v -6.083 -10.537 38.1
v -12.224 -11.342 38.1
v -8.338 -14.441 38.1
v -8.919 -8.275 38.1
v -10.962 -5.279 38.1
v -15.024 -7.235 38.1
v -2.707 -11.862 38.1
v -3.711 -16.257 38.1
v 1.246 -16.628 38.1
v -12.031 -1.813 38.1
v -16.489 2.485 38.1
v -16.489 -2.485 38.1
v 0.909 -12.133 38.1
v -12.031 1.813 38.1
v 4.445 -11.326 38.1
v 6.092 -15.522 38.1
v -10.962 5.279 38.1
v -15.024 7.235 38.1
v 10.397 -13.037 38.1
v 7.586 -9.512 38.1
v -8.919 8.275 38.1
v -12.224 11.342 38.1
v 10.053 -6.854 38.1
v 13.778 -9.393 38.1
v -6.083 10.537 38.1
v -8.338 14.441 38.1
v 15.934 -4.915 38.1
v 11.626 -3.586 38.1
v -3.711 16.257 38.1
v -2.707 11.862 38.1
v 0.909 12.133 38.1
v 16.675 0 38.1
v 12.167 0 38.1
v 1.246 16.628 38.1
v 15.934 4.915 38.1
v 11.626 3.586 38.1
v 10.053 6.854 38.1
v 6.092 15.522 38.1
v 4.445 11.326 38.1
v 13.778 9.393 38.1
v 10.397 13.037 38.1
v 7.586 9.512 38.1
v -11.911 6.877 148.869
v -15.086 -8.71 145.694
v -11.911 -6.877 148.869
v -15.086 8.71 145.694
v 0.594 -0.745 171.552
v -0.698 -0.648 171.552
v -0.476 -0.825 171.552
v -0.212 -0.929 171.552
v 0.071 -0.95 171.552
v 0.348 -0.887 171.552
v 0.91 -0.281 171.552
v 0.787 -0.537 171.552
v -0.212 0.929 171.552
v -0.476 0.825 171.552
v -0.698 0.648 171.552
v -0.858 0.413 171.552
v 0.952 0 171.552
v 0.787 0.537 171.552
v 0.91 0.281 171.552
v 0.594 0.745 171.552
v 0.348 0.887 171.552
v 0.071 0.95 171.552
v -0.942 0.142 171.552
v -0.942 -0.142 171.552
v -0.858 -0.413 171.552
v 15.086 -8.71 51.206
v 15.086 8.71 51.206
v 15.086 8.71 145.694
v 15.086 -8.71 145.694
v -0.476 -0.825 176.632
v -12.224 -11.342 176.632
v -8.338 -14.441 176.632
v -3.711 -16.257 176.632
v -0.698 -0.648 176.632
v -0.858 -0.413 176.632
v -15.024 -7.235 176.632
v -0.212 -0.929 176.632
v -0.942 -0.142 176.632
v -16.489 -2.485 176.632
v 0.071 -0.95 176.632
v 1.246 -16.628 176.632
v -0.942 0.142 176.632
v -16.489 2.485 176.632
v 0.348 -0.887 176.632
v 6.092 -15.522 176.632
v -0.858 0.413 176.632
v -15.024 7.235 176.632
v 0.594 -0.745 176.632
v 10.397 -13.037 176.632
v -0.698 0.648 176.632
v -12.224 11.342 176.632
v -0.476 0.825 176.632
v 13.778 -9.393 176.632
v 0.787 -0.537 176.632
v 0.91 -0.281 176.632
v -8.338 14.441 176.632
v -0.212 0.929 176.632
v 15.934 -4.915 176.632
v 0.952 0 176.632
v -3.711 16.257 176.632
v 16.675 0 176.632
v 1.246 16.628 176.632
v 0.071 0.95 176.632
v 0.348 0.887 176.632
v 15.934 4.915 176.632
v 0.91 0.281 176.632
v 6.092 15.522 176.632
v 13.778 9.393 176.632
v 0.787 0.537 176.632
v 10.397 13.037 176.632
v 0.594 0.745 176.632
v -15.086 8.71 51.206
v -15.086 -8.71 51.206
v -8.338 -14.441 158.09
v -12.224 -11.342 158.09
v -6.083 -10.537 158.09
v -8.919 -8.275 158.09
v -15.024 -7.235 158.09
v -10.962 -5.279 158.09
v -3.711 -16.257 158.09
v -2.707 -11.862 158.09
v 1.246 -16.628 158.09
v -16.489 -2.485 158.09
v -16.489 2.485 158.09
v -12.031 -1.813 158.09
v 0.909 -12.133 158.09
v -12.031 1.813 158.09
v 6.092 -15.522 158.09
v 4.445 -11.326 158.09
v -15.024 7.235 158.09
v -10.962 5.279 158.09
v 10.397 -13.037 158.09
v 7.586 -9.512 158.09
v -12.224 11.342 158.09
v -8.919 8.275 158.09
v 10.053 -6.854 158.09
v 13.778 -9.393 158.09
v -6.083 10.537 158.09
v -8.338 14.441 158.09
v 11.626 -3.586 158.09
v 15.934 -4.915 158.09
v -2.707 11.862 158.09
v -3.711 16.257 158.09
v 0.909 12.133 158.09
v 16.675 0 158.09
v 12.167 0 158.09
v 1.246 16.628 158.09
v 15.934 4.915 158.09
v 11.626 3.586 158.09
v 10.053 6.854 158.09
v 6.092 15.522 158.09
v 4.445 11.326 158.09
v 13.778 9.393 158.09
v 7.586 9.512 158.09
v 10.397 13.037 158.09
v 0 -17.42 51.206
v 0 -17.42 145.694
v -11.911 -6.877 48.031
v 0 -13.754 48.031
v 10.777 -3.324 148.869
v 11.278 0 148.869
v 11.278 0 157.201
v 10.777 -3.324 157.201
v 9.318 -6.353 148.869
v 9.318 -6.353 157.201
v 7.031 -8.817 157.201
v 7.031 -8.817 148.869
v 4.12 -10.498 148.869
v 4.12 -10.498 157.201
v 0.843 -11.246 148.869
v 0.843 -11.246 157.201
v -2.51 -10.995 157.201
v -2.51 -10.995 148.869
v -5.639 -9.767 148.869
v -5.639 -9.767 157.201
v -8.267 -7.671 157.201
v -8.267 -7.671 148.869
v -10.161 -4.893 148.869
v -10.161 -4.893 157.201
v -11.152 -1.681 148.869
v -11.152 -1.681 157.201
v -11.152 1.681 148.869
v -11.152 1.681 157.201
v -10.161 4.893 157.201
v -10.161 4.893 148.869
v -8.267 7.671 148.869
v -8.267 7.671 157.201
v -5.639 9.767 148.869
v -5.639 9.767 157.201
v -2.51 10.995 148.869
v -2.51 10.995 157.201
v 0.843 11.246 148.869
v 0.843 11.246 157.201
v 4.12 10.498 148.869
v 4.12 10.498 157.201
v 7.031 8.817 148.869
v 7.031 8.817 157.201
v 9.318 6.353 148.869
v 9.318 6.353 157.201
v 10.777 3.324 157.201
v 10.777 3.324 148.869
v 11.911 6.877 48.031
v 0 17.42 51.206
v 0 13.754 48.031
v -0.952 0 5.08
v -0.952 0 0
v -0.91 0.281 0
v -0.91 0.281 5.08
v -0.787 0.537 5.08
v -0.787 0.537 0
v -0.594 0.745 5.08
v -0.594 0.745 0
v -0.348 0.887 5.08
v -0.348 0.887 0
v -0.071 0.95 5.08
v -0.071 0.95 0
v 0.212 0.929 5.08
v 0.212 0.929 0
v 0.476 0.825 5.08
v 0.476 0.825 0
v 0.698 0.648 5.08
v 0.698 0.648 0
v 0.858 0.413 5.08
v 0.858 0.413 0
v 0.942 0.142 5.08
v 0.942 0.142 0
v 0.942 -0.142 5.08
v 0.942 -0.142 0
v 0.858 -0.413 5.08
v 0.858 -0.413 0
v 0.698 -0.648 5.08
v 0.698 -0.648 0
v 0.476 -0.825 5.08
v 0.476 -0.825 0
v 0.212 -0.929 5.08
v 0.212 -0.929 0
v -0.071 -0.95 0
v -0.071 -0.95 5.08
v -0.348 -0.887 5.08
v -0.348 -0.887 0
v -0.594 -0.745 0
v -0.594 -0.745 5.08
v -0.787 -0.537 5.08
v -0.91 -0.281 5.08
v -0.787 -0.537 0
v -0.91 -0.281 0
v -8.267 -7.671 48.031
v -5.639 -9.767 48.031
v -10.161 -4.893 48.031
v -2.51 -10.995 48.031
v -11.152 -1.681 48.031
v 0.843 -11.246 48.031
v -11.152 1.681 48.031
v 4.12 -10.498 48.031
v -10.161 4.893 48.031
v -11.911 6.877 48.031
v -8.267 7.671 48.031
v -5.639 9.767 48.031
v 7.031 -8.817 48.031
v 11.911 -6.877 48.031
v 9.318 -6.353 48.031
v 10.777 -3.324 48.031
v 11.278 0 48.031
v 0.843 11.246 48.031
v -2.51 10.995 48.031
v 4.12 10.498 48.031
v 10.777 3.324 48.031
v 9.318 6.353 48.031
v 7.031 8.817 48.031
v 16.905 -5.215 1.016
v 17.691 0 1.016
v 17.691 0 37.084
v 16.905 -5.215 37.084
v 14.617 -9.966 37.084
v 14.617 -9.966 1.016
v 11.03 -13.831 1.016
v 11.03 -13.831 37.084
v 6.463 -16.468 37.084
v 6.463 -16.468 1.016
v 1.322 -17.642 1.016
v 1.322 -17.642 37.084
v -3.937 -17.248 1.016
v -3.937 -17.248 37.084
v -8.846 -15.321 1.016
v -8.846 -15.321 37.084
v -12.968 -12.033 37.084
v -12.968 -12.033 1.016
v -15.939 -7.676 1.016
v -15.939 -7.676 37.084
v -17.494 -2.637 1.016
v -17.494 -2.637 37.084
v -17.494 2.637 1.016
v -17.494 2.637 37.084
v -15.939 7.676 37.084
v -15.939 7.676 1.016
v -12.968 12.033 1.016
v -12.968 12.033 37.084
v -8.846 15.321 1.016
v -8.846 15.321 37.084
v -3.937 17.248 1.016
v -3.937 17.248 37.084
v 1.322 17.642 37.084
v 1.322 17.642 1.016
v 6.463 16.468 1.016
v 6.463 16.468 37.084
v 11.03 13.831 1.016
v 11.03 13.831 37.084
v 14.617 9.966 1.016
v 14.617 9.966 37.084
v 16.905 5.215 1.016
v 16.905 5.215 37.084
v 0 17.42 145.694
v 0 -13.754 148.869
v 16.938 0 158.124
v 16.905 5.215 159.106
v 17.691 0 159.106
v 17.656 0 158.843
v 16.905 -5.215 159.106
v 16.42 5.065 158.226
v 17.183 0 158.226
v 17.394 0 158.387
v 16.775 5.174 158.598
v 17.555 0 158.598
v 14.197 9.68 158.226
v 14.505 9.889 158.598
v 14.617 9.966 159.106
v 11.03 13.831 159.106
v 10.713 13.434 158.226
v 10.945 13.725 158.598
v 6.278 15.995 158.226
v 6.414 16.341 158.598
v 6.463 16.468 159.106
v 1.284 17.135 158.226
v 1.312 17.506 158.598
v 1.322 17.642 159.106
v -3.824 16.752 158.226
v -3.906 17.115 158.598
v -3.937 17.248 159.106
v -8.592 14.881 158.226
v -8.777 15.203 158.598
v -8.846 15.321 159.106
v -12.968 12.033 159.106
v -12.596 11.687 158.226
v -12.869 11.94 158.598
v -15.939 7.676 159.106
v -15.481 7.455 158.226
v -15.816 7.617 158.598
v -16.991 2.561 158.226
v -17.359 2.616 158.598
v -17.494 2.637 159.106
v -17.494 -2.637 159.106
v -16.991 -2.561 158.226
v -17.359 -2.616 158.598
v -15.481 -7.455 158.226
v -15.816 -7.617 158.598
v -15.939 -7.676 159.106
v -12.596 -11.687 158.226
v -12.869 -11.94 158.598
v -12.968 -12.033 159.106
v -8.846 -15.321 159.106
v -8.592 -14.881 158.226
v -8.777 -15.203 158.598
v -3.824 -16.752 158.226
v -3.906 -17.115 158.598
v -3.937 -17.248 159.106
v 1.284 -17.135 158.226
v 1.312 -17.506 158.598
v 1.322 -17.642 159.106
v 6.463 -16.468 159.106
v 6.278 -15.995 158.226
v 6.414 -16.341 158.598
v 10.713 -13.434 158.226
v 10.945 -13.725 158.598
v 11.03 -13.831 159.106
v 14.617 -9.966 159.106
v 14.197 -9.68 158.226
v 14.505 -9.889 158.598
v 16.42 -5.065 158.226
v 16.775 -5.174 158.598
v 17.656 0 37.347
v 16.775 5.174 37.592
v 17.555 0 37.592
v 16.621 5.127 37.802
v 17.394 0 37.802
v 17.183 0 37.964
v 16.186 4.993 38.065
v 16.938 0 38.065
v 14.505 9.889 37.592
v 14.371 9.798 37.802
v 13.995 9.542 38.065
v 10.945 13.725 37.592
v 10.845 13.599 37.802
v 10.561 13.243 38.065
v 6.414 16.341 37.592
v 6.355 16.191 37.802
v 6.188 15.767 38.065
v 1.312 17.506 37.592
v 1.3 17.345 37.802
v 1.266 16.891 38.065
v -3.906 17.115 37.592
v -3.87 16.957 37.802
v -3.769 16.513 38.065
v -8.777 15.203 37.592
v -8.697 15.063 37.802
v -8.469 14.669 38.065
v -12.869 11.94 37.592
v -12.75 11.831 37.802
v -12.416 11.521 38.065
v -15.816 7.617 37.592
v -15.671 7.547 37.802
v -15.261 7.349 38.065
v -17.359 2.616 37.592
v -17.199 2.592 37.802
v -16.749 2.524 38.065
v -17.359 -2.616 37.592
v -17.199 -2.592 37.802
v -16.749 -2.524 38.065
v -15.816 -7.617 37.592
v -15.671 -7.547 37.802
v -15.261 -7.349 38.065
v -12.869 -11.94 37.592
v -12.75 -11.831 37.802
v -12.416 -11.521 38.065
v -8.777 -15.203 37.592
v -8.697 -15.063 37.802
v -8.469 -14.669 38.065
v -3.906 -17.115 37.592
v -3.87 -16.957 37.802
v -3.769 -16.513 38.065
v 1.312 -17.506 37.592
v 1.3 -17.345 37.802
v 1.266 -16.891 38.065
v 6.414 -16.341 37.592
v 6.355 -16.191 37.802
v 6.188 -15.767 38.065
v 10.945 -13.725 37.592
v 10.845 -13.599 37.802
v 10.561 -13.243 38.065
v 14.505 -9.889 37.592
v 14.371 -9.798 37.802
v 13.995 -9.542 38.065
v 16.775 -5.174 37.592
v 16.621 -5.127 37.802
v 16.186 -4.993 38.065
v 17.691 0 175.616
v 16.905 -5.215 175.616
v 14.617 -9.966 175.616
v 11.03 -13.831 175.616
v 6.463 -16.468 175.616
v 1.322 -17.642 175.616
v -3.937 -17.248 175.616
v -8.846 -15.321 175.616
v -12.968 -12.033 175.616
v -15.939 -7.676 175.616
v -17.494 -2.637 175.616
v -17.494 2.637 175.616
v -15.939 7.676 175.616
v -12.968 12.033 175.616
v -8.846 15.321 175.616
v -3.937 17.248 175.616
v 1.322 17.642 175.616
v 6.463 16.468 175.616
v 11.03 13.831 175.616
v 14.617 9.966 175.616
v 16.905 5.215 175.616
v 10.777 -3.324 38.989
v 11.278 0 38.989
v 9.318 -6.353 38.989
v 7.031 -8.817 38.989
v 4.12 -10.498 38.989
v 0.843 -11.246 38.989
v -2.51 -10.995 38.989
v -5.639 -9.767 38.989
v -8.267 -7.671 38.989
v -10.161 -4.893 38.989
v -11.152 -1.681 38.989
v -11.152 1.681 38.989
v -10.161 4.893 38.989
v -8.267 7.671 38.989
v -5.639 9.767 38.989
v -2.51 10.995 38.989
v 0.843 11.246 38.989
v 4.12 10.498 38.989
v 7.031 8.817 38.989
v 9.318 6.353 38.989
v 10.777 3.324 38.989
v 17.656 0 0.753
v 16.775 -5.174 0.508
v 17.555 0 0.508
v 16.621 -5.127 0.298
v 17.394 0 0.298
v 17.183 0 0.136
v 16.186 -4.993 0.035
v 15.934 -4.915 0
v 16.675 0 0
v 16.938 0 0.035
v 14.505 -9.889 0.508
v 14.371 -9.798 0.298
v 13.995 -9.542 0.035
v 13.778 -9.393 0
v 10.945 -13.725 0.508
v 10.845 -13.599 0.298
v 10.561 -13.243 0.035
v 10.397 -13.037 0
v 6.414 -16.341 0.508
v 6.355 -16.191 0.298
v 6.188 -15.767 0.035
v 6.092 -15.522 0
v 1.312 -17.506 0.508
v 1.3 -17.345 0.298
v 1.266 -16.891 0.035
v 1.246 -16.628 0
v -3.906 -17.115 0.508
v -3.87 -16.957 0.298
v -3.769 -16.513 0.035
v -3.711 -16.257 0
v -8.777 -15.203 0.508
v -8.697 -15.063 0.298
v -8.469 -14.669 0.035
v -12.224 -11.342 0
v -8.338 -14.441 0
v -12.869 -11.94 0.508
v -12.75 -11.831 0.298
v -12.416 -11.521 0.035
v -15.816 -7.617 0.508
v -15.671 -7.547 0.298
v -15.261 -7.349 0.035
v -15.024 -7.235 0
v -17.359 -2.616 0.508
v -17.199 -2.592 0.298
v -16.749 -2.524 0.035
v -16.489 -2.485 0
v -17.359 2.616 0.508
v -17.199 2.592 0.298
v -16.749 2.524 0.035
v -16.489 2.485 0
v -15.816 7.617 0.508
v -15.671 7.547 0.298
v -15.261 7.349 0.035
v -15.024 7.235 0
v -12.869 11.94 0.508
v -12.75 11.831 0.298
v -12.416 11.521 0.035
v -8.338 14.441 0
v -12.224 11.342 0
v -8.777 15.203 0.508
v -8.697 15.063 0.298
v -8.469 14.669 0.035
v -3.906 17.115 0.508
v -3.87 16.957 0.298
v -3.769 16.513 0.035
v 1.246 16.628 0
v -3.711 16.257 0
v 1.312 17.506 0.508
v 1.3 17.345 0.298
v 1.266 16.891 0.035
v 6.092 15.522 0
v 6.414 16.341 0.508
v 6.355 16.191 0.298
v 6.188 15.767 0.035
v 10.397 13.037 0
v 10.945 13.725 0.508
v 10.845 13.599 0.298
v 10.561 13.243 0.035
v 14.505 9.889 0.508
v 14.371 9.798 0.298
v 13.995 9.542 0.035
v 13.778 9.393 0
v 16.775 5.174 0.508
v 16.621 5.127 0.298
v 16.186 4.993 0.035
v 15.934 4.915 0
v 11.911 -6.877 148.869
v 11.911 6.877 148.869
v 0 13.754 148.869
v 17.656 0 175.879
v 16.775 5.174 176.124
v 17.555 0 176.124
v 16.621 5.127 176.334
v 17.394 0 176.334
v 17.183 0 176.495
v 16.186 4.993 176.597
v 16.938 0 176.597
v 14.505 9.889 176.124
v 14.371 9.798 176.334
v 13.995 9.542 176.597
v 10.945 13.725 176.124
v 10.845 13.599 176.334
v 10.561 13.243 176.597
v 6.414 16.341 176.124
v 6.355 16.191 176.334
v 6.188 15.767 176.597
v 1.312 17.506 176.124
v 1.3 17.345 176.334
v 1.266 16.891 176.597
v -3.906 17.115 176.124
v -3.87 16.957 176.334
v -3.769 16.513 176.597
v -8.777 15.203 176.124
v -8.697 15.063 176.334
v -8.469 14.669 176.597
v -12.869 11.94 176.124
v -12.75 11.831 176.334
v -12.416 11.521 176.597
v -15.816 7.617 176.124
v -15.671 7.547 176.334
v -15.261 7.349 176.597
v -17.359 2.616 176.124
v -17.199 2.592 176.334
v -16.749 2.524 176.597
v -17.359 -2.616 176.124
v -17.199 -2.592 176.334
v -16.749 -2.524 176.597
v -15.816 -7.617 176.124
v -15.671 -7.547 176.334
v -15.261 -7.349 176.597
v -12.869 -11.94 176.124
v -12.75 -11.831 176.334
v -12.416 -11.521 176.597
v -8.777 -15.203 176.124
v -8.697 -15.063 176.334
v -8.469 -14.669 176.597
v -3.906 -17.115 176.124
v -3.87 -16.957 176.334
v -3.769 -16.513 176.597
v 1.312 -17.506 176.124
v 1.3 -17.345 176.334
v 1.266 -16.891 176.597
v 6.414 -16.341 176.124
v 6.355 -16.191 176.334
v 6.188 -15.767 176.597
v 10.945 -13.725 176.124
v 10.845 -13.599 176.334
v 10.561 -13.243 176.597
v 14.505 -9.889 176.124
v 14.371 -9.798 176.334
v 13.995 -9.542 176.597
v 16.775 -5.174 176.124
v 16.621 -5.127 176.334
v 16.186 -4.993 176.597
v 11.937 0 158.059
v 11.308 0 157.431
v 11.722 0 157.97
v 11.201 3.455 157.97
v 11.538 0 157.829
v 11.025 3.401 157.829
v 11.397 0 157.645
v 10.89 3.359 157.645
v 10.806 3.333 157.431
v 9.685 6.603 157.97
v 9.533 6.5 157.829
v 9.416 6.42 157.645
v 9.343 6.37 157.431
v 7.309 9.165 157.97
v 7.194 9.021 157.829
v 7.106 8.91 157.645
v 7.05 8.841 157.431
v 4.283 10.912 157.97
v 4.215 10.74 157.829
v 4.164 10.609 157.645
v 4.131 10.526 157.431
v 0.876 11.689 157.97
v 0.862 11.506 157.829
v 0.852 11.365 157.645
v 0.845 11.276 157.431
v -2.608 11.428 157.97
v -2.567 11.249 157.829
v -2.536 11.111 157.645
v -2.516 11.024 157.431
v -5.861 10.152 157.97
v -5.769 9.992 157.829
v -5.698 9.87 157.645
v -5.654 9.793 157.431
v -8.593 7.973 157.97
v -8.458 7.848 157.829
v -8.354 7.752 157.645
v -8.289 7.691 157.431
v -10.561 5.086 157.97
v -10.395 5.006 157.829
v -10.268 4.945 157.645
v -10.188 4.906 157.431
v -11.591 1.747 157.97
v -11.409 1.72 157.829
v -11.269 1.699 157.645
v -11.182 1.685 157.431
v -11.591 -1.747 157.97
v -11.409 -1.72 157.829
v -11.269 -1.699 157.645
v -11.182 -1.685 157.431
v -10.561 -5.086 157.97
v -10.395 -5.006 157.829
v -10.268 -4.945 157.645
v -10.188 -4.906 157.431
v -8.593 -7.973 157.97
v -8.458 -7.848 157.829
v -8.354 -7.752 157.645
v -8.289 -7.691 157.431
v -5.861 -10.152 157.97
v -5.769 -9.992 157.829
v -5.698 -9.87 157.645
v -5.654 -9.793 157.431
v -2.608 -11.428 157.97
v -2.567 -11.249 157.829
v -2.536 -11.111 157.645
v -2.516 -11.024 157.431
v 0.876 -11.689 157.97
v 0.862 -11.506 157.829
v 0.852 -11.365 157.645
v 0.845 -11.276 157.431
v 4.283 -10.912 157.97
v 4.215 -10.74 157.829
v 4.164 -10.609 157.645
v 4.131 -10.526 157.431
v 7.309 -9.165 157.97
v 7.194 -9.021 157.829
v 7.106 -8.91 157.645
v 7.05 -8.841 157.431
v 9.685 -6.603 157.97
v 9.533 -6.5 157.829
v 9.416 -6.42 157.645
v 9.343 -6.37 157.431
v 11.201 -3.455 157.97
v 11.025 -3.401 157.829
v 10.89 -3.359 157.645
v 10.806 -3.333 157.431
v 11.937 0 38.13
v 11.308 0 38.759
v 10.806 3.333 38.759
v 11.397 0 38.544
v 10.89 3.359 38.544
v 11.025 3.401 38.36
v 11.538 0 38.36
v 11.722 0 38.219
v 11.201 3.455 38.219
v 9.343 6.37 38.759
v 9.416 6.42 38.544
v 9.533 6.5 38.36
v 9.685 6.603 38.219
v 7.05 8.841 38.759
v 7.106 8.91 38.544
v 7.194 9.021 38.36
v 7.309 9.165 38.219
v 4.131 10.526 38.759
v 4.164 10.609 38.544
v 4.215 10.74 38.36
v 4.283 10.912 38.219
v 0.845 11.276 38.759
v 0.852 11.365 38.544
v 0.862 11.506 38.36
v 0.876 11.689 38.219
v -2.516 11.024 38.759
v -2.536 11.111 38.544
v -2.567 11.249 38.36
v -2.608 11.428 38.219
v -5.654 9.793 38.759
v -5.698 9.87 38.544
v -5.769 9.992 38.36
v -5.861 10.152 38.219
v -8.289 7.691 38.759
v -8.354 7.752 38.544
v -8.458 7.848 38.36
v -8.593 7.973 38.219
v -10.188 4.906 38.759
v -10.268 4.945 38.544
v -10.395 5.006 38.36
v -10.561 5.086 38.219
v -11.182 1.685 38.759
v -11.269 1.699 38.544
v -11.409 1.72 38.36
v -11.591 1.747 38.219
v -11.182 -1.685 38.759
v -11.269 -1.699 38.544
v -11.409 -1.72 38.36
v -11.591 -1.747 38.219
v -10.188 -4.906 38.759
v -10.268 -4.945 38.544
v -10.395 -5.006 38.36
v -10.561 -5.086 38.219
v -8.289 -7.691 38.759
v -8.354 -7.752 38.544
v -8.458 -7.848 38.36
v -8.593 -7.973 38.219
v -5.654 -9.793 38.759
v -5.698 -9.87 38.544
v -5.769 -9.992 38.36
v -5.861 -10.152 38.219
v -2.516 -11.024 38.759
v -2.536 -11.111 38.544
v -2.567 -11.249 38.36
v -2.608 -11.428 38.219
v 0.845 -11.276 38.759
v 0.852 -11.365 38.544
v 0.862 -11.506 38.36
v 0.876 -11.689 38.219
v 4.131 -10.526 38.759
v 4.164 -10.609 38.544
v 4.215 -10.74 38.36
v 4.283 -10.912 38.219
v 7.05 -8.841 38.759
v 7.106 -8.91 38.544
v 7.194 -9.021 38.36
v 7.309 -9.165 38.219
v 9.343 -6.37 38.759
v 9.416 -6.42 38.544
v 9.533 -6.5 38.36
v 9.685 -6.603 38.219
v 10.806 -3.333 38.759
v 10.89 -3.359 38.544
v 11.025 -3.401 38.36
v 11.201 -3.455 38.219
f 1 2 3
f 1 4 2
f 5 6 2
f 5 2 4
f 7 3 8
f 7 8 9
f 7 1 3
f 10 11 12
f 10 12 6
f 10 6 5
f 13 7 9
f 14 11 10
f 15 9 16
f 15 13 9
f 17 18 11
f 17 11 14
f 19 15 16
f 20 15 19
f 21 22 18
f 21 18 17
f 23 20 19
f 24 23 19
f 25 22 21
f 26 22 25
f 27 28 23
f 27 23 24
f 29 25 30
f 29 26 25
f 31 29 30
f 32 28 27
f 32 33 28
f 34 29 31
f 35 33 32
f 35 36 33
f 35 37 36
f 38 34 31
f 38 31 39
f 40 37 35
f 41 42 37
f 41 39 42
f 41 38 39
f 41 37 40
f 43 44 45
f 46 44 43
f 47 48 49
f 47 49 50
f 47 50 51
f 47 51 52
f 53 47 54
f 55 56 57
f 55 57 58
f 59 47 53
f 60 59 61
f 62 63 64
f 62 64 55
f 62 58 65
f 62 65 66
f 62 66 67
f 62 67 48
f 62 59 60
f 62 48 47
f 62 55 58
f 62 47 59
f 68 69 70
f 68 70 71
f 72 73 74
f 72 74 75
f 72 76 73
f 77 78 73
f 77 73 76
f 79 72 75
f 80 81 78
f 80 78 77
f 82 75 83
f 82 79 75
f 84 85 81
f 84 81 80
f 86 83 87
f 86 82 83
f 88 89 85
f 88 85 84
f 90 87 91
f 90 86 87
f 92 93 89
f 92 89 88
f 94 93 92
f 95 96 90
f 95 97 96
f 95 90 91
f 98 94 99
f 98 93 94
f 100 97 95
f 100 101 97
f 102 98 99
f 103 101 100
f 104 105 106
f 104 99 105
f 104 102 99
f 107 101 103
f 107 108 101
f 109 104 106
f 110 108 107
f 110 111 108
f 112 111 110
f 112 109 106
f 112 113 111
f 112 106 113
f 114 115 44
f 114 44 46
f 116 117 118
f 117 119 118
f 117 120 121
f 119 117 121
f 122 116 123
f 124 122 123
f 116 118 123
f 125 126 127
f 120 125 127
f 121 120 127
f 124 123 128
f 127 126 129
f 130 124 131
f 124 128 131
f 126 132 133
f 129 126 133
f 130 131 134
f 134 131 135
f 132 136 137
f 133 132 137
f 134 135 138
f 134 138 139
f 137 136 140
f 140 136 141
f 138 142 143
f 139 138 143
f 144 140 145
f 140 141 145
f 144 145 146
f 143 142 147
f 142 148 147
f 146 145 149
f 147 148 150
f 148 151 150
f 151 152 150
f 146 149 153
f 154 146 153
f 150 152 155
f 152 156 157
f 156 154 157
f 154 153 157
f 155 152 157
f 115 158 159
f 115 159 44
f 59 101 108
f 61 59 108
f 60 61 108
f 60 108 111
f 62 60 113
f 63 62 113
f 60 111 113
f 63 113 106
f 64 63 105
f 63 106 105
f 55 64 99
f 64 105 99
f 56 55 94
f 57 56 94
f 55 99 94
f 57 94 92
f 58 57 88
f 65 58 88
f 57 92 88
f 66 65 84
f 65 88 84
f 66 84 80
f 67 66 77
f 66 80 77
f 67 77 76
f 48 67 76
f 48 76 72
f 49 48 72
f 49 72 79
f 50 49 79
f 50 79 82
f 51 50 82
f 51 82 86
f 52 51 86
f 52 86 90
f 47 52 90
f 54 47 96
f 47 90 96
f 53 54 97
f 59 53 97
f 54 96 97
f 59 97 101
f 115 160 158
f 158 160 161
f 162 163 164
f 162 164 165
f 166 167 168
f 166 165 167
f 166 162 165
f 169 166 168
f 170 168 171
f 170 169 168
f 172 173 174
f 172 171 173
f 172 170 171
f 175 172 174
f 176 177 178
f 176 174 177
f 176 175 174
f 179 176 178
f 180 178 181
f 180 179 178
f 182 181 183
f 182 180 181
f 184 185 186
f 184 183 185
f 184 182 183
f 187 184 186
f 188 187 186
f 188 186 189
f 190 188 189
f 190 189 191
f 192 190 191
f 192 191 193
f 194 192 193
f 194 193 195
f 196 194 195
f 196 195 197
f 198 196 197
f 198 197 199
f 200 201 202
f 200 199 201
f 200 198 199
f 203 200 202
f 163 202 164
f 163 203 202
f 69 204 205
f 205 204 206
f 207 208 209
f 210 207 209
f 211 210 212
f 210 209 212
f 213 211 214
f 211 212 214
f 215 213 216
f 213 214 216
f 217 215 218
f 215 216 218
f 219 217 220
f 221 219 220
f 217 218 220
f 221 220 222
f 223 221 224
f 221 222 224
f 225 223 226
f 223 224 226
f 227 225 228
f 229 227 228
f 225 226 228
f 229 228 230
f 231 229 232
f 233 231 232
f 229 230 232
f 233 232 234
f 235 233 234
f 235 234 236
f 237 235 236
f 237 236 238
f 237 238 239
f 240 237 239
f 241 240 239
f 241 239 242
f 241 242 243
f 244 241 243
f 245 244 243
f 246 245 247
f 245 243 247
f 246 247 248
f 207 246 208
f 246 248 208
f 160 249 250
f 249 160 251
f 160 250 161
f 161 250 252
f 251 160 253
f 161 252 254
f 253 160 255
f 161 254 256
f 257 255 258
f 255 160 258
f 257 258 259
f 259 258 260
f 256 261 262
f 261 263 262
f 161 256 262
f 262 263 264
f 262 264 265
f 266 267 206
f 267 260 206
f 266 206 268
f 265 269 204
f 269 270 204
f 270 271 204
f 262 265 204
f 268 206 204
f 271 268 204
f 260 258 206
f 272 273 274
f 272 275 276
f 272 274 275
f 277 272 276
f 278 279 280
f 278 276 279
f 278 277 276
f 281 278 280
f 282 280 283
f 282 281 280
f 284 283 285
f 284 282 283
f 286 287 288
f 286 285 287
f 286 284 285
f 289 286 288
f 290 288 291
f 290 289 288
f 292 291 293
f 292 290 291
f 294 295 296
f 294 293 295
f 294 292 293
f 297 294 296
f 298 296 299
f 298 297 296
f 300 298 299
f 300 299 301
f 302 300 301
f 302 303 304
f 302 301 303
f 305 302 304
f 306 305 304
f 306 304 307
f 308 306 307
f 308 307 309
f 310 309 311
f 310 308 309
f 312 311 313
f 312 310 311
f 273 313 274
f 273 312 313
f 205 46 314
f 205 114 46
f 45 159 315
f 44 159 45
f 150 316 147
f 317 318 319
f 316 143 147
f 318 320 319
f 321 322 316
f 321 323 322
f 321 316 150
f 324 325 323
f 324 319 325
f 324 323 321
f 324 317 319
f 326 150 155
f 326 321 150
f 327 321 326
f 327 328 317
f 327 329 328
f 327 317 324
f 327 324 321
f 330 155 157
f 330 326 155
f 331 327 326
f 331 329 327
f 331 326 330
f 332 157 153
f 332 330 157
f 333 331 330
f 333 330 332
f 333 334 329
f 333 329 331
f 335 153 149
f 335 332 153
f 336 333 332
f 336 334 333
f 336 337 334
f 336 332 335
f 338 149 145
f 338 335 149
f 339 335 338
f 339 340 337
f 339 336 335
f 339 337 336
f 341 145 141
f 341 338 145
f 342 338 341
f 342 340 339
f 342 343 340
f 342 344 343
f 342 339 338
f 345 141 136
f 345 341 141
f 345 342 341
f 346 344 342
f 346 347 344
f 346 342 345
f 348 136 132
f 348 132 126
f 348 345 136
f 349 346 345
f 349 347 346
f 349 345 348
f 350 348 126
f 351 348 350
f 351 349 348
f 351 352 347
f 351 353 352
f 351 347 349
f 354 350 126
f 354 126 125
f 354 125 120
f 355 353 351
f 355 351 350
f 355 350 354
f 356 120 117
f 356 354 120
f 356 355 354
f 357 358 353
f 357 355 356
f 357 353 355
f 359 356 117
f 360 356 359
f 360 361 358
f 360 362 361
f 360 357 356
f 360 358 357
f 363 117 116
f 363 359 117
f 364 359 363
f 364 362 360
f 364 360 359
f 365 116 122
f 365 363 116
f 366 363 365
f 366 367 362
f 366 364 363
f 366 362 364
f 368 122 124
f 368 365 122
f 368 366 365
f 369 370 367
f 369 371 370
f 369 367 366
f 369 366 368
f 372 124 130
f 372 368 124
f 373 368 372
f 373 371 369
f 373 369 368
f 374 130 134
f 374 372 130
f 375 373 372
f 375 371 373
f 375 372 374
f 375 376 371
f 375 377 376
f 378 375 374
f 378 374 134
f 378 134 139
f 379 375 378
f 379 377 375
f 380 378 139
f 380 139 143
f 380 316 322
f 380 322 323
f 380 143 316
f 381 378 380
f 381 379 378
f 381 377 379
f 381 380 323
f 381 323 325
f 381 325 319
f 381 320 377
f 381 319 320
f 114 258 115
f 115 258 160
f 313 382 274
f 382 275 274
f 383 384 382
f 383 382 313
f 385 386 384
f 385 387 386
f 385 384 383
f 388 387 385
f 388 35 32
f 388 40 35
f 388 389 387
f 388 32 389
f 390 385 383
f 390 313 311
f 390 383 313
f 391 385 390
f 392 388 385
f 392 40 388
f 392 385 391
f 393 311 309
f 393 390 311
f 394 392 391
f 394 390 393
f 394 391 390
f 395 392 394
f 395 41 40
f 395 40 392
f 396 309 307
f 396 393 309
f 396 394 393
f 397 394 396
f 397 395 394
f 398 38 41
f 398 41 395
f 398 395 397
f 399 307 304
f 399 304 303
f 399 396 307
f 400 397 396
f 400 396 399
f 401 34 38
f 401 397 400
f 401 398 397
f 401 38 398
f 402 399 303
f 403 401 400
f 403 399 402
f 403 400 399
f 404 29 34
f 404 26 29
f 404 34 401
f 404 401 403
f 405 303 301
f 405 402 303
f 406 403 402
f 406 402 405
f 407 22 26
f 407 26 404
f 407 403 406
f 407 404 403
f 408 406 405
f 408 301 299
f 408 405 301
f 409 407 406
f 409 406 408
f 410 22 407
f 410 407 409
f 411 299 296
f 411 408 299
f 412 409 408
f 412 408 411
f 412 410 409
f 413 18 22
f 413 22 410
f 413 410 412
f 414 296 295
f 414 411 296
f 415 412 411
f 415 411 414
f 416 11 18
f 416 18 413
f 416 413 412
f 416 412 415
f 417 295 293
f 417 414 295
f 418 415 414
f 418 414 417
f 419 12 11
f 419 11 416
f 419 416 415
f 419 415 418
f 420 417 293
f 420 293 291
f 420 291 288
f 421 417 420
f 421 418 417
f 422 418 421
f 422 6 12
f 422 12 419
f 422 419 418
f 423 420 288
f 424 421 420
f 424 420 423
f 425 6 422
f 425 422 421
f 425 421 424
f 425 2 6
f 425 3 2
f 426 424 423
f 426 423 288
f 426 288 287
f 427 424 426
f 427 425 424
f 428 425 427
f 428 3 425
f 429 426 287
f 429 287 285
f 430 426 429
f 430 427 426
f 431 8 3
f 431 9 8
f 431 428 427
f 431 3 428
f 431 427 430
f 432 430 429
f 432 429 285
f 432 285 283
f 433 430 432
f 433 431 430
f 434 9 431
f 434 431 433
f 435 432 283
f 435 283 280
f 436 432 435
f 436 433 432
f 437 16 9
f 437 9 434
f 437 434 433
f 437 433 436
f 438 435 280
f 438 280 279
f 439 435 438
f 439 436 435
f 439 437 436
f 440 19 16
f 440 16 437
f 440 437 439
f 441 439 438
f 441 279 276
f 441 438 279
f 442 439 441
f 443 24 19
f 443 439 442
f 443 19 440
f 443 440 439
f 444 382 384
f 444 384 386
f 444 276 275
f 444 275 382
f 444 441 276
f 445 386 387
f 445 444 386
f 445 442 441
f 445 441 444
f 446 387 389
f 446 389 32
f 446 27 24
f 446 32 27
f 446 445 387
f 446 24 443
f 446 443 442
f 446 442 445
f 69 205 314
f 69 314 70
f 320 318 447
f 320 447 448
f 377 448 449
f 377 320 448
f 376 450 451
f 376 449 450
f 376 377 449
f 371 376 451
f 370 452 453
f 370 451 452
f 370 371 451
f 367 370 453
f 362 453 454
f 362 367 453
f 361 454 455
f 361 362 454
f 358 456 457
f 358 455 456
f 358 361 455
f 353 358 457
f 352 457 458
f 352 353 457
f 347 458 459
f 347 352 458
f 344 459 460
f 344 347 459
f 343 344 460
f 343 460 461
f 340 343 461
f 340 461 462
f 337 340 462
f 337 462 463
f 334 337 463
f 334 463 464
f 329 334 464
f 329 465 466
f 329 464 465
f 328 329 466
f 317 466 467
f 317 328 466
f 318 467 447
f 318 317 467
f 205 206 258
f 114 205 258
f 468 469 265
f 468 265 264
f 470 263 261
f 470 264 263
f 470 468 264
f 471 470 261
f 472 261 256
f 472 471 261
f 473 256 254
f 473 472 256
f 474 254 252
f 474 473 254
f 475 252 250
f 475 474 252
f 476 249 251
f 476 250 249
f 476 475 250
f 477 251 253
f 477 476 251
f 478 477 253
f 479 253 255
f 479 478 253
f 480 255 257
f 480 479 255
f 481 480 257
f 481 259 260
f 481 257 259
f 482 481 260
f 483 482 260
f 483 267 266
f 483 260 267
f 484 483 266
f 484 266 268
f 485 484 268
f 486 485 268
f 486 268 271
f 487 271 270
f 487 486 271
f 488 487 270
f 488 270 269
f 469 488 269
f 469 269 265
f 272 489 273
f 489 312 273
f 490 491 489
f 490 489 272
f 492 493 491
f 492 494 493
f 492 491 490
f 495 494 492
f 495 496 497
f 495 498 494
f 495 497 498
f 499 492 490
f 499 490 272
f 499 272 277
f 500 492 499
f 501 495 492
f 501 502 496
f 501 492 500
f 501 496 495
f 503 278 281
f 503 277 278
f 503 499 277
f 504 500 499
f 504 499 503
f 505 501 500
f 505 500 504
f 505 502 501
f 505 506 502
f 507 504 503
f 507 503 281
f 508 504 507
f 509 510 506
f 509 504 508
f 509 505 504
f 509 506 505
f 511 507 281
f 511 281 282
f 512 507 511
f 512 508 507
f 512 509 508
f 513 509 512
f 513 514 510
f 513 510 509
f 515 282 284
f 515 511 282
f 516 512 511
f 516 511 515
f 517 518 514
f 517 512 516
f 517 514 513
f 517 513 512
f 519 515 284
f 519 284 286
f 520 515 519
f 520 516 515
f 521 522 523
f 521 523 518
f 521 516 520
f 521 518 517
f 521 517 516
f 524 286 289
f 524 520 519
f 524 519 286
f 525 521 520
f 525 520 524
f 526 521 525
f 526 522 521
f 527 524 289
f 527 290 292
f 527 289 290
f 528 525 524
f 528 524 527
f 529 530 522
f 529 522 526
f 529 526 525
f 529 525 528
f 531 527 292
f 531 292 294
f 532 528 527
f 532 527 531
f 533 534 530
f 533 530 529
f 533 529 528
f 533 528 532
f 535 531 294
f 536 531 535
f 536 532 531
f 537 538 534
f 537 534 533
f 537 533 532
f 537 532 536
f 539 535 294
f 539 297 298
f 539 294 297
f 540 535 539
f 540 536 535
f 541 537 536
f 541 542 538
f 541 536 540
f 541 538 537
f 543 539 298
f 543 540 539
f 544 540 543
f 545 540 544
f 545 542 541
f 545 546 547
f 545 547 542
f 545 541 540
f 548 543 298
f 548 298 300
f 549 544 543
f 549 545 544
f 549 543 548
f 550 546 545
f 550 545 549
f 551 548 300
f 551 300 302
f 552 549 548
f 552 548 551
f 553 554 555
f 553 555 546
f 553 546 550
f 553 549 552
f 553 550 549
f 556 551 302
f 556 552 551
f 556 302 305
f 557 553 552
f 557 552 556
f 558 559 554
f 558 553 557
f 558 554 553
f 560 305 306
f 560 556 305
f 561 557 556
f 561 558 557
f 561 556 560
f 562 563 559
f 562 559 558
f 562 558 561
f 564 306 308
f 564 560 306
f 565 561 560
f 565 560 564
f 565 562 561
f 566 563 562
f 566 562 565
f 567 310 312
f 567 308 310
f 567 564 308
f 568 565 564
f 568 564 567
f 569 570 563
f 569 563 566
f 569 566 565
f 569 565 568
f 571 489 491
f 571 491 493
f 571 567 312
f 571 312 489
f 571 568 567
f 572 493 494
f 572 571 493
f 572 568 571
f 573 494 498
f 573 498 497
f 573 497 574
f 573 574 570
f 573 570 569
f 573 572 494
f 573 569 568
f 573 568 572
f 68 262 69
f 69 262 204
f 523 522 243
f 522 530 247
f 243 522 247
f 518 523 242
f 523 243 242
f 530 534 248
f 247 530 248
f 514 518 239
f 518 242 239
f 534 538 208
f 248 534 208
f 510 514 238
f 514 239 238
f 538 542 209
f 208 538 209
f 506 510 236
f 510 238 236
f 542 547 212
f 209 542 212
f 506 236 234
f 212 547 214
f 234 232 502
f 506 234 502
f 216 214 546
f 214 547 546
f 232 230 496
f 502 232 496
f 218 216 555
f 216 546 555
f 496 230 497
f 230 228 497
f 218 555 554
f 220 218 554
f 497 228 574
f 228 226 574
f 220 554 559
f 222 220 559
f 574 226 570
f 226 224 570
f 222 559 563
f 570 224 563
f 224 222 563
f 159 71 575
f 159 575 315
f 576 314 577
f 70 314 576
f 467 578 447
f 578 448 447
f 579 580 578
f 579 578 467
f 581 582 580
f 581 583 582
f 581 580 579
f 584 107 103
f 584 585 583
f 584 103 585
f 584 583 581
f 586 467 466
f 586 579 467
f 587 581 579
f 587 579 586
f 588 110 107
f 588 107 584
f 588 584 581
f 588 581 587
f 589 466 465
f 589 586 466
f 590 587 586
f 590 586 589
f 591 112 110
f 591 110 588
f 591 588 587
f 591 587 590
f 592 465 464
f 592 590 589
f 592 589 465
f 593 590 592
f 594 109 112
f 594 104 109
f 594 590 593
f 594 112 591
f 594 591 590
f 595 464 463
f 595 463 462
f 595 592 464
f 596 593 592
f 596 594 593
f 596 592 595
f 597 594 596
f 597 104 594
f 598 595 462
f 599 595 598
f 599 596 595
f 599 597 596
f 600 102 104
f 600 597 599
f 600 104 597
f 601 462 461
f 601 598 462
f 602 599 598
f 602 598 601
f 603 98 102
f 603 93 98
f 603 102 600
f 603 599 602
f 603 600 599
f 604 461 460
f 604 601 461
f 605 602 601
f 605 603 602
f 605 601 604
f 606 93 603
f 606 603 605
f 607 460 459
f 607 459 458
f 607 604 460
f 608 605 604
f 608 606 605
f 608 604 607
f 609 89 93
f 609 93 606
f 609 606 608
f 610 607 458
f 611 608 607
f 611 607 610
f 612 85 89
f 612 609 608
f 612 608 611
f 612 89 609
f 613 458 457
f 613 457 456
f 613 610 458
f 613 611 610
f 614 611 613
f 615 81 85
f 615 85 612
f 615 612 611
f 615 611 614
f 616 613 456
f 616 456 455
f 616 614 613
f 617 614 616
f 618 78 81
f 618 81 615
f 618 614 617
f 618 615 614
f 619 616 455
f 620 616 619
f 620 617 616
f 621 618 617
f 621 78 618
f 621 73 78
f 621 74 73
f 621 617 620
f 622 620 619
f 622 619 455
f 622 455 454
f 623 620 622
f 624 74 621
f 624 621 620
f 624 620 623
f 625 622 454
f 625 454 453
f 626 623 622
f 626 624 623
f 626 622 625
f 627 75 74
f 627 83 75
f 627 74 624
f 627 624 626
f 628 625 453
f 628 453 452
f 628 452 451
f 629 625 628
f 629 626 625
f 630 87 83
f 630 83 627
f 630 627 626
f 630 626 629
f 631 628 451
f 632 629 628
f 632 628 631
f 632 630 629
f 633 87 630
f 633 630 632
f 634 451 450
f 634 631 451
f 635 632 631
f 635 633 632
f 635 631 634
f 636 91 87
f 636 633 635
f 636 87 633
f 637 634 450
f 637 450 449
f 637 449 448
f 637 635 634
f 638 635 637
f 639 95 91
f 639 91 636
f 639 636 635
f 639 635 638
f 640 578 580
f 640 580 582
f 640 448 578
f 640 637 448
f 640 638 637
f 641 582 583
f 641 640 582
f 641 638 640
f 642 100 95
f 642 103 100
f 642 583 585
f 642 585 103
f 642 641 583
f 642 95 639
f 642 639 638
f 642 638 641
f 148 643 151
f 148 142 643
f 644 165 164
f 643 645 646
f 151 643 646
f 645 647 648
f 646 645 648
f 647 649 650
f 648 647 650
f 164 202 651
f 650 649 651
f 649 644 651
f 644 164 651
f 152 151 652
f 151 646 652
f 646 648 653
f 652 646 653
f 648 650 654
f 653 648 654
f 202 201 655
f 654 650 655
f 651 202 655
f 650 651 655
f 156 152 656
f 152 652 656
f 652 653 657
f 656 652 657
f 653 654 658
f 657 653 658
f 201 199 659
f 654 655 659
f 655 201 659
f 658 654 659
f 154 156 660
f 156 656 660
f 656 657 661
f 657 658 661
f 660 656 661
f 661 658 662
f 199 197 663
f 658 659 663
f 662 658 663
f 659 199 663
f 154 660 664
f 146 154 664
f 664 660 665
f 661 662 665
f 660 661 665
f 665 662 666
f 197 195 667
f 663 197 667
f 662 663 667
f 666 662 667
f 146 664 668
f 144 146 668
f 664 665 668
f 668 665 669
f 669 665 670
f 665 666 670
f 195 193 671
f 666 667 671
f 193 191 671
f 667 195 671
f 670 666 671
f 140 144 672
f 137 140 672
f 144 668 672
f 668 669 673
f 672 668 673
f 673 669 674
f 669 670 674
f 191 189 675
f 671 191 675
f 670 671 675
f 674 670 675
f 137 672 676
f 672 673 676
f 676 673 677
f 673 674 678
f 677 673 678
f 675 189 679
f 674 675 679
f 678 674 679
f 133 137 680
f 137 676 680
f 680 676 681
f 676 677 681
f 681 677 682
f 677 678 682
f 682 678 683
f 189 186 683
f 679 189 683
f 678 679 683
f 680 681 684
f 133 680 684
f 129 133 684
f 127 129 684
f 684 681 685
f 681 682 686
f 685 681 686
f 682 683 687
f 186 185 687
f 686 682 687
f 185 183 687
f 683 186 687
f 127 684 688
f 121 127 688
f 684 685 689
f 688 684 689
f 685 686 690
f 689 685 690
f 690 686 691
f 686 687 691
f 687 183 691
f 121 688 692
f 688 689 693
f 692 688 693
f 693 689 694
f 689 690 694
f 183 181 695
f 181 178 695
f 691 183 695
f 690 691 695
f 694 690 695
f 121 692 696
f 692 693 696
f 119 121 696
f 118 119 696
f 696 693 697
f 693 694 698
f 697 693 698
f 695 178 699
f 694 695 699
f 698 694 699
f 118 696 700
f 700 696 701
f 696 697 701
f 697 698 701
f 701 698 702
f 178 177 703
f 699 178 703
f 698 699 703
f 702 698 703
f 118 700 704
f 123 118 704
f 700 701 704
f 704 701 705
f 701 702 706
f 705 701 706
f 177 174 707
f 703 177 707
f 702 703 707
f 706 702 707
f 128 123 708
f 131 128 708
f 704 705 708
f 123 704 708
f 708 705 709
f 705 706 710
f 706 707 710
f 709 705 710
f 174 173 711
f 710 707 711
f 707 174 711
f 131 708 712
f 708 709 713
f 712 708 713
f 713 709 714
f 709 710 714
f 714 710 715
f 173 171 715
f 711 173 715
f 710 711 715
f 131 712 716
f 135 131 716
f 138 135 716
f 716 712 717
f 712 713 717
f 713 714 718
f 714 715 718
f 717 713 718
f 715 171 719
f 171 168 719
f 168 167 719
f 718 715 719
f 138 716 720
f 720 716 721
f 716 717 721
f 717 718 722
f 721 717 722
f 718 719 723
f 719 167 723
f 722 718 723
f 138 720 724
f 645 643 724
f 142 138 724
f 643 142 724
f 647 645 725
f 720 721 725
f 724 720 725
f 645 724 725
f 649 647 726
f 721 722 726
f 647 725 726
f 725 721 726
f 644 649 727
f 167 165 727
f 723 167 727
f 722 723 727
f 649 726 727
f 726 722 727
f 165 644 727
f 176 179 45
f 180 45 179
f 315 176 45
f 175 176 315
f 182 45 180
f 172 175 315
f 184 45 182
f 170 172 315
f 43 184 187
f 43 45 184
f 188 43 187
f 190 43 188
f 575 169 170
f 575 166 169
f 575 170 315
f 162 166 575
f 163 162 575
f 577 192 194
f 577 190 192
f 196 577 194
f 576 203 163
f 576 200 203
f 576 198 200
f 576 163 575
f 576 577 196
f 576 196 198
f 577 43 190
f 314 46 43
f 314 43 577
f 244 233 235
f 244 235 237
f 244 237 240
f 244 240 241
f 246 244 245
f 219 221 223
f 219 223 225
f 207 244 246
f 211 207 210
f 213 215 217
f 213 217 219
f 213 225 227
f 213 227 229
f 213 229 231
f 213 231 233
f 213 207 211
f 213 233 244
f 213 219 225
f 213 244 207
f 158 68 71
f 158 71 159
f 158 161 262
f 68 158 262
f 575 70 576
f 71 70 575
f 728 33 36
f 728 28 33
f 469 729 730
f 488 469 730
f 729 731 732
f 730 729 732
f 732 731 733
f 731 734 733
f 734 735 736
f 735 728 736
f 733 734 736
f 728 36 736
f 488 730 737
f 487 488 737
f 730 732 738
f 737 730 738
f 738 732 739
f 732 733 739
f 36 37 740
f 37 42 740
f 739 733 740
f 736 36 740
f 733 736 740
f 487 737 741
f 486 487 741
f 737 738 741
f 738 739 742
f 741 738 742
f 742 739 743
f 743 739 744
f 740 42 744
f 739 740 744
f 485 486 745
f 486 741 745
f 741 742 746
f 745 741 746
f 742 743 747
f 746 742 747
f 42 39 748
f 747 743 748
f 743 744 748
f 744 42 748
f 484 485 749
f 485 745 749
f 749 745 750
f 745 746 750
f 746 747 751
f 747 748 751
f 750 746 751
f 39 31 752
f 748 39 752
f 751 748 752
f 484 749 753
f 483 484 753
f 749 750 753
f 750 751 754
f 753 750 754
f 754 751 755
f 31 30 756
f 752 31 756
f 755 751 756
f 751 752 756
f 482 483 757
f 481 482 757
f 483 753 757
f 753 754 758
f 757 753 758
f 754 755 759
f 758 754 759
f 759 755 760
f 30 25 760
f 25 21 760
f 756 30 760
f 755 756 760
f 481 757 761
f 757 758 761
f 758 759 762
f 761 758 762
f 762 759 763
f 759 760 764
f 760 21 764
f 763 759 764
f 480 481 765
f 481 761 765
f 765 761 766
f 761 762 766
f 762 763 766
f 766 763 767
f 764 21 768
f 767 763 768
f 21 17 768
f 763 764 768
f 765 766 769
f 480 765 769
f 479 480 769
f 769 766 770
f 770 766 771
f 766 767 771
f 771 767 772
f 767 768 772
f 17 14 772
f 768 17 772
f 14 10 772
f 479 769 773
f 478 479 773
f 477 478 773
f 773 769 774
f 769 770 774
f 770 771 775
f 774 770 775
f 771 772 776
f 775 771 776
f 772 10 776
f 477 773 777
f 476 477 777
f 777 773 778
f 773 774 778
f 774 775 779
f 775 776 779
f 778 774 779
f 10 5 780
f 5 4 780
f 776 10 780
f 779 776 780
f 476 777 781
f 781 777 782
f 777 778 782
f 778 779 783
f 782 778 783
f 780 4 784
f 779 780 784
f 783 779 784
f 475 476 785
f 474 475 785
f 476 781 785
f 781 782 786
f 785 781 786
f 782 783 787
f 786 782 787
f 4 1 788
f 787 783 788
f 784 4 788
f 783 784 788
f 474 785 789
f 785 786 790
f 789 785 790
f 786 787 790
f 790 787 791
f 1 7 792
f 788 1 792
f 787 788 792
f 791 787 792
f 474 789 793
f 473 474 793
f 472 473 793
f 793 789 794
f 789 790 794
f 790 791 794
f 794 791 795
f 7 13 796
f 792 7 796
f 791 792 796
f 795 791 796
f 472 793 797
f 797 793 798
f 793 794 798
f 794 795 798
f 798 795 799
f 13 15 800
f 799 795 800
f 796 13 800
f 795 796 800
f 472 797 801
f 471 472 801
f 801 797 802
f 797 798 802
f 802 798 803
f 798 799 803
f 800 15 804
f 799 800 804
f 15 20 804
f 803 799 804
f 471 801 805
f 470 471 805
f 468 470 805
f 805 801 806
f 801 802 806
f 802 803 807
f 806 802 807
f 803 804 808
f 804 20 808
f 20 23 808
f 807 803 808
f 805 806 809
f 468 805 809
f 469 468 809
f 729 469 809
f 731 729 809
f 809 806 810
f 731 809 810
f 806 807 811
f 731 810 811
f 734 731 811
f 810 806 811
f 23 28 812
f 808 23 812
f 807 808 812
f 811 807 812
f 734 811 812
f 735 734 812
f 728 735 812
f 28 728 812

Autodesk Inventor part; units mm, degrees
ref_plane "YZ Plane" through (0, 0, 0) normal (1, 0, 0) x (0, 1, 0)
ref_plane "XZ Plane" through (0, 0, 0) normal (0, 1, 0) x (-1, 0, 0)
ref_plane "XY Plane" through (0, 0, 0) normal (0, 0, 1) x (1, 0, 0)
sketch "Sketch1" plane through (0, 0, 0) normal (0, 0, 1) x (1, 0, 0)
  circle A0 centre (0, 0) radius 17.6911
  dimension "d0" = 35.3822
extrude "Extrusion1" add sketch "Sketch1" along normal blind 38.1
sketch "Sketch2" plane through (0, 0, 38.1) normal (0, 0, 1) x (1, 0, 0)
  circle A0 centre (0, 0) radius 11.2776
  dimension "d3" = 22.5552
extrude "Extrusion2" add sketch "Sketch2" along normal blind 9.9314
sketch "Sketch4" plane through (0, 0, 48.0314) normal (0, 0, 1) x (1, 0, 0)
  line L0 (0, 17.4198) -> (15.086, 8.7099)
  line L1 (15.086, 8.7099) -> (15.086, -8.7099)
  line L2 (15.086, -8.7099) -> (0, -17.4198)
  line L3 (0, -17.4198) -> (-15.086, -8.7099)
  line L4 (-15.086, -8.7099) -> (-15.086, 8.7099)
  line L5 (-15.086, 8.7099) -> (0, 17.4198)
  point P0 (0, 0)
  point P1 (0, 0)
extrude "Extrusion4" add sketch "Sketch4" along normal blind 100.838
sketch "Sketch5" plane through (0, 0, 148.8694) normal (0, 0, 1) x (1, 0, 0)
  circle A0 centre (0, 0) radius 11.2776
extrude "Extrusion5" add sketch "Sketch5" along normal blind 9.2202
sketch "Sketch6" plane through (0, 0, 158.0896) normal (0, 0, 1) x (1, 0, 0)
  circle A0 centre (0, 0) radius 17.6911
extrude "Extrusion6" add sketch "Sketch6" along normal blind 18.542
fillet "Fillet1" radius 1.016 1 edges at (-17.6911, 0, 176.6316)
fillet "Fillet2" radius 0.889 1 edges at (-11.2776, 0, 158.0896)
chamfer "Chamfer1" distance 3.175 angle 45 12 edges at (7.543, 13.0648, 148.8694) (15.086, 0, 148.8694) (7.543, -13.0648, 148.8694) (-7.543, -13.0648, 148.8694) (-15.086, 0, 148.8694) (-7.543, 13.0648, 148.8694) (-7.543, -13.0648, 48.0314) (-15.086, 0, 48.0314) (7.543, -13.0648, 48.0314) (15.086, 0, 48.0314) (-7.543, 13.0648, 48.0314) (7.543, 13.0648, 48.0314)
fillet "Fillet3" radius 0.889 1 edges at (-11.2776, 0, 38.1)
fillet "Fillet4" radius 1.016 1 edges at (-17.6911, 0, 0)
fillet "Fillet5" radius 1.016 1 edges at (-17.6911, 0, 38.1)
fillet "Fillet6" radius 1.016 1 edges at (-17.6911, 0, 158.0896)
sketch "Sketch7" plane through (0, 0, 176.6316) normal (0, 0, 1) x (1, 0, 0)
  circle A0 centre (0, 0) radius 11.2776 projected
  circle A1 centre (0, 0) radius 0.9525
  dimension "d23" = 1.905
extrude "Extrusion7" cut sketch "Sketch7" against normal blind 5.08 contours A1
sketch "Sketch8" plane through (0, 0, 0) normal (0, 0, -1) x (-1, 0, 0)
  circle A0 centre (0, 0) radius 0.9525 projected
  circle A1 centre (0, 0) radius 0.9525
extrude "Extrusion8" cut sketch "Sketch8" against normal blind 5.08
